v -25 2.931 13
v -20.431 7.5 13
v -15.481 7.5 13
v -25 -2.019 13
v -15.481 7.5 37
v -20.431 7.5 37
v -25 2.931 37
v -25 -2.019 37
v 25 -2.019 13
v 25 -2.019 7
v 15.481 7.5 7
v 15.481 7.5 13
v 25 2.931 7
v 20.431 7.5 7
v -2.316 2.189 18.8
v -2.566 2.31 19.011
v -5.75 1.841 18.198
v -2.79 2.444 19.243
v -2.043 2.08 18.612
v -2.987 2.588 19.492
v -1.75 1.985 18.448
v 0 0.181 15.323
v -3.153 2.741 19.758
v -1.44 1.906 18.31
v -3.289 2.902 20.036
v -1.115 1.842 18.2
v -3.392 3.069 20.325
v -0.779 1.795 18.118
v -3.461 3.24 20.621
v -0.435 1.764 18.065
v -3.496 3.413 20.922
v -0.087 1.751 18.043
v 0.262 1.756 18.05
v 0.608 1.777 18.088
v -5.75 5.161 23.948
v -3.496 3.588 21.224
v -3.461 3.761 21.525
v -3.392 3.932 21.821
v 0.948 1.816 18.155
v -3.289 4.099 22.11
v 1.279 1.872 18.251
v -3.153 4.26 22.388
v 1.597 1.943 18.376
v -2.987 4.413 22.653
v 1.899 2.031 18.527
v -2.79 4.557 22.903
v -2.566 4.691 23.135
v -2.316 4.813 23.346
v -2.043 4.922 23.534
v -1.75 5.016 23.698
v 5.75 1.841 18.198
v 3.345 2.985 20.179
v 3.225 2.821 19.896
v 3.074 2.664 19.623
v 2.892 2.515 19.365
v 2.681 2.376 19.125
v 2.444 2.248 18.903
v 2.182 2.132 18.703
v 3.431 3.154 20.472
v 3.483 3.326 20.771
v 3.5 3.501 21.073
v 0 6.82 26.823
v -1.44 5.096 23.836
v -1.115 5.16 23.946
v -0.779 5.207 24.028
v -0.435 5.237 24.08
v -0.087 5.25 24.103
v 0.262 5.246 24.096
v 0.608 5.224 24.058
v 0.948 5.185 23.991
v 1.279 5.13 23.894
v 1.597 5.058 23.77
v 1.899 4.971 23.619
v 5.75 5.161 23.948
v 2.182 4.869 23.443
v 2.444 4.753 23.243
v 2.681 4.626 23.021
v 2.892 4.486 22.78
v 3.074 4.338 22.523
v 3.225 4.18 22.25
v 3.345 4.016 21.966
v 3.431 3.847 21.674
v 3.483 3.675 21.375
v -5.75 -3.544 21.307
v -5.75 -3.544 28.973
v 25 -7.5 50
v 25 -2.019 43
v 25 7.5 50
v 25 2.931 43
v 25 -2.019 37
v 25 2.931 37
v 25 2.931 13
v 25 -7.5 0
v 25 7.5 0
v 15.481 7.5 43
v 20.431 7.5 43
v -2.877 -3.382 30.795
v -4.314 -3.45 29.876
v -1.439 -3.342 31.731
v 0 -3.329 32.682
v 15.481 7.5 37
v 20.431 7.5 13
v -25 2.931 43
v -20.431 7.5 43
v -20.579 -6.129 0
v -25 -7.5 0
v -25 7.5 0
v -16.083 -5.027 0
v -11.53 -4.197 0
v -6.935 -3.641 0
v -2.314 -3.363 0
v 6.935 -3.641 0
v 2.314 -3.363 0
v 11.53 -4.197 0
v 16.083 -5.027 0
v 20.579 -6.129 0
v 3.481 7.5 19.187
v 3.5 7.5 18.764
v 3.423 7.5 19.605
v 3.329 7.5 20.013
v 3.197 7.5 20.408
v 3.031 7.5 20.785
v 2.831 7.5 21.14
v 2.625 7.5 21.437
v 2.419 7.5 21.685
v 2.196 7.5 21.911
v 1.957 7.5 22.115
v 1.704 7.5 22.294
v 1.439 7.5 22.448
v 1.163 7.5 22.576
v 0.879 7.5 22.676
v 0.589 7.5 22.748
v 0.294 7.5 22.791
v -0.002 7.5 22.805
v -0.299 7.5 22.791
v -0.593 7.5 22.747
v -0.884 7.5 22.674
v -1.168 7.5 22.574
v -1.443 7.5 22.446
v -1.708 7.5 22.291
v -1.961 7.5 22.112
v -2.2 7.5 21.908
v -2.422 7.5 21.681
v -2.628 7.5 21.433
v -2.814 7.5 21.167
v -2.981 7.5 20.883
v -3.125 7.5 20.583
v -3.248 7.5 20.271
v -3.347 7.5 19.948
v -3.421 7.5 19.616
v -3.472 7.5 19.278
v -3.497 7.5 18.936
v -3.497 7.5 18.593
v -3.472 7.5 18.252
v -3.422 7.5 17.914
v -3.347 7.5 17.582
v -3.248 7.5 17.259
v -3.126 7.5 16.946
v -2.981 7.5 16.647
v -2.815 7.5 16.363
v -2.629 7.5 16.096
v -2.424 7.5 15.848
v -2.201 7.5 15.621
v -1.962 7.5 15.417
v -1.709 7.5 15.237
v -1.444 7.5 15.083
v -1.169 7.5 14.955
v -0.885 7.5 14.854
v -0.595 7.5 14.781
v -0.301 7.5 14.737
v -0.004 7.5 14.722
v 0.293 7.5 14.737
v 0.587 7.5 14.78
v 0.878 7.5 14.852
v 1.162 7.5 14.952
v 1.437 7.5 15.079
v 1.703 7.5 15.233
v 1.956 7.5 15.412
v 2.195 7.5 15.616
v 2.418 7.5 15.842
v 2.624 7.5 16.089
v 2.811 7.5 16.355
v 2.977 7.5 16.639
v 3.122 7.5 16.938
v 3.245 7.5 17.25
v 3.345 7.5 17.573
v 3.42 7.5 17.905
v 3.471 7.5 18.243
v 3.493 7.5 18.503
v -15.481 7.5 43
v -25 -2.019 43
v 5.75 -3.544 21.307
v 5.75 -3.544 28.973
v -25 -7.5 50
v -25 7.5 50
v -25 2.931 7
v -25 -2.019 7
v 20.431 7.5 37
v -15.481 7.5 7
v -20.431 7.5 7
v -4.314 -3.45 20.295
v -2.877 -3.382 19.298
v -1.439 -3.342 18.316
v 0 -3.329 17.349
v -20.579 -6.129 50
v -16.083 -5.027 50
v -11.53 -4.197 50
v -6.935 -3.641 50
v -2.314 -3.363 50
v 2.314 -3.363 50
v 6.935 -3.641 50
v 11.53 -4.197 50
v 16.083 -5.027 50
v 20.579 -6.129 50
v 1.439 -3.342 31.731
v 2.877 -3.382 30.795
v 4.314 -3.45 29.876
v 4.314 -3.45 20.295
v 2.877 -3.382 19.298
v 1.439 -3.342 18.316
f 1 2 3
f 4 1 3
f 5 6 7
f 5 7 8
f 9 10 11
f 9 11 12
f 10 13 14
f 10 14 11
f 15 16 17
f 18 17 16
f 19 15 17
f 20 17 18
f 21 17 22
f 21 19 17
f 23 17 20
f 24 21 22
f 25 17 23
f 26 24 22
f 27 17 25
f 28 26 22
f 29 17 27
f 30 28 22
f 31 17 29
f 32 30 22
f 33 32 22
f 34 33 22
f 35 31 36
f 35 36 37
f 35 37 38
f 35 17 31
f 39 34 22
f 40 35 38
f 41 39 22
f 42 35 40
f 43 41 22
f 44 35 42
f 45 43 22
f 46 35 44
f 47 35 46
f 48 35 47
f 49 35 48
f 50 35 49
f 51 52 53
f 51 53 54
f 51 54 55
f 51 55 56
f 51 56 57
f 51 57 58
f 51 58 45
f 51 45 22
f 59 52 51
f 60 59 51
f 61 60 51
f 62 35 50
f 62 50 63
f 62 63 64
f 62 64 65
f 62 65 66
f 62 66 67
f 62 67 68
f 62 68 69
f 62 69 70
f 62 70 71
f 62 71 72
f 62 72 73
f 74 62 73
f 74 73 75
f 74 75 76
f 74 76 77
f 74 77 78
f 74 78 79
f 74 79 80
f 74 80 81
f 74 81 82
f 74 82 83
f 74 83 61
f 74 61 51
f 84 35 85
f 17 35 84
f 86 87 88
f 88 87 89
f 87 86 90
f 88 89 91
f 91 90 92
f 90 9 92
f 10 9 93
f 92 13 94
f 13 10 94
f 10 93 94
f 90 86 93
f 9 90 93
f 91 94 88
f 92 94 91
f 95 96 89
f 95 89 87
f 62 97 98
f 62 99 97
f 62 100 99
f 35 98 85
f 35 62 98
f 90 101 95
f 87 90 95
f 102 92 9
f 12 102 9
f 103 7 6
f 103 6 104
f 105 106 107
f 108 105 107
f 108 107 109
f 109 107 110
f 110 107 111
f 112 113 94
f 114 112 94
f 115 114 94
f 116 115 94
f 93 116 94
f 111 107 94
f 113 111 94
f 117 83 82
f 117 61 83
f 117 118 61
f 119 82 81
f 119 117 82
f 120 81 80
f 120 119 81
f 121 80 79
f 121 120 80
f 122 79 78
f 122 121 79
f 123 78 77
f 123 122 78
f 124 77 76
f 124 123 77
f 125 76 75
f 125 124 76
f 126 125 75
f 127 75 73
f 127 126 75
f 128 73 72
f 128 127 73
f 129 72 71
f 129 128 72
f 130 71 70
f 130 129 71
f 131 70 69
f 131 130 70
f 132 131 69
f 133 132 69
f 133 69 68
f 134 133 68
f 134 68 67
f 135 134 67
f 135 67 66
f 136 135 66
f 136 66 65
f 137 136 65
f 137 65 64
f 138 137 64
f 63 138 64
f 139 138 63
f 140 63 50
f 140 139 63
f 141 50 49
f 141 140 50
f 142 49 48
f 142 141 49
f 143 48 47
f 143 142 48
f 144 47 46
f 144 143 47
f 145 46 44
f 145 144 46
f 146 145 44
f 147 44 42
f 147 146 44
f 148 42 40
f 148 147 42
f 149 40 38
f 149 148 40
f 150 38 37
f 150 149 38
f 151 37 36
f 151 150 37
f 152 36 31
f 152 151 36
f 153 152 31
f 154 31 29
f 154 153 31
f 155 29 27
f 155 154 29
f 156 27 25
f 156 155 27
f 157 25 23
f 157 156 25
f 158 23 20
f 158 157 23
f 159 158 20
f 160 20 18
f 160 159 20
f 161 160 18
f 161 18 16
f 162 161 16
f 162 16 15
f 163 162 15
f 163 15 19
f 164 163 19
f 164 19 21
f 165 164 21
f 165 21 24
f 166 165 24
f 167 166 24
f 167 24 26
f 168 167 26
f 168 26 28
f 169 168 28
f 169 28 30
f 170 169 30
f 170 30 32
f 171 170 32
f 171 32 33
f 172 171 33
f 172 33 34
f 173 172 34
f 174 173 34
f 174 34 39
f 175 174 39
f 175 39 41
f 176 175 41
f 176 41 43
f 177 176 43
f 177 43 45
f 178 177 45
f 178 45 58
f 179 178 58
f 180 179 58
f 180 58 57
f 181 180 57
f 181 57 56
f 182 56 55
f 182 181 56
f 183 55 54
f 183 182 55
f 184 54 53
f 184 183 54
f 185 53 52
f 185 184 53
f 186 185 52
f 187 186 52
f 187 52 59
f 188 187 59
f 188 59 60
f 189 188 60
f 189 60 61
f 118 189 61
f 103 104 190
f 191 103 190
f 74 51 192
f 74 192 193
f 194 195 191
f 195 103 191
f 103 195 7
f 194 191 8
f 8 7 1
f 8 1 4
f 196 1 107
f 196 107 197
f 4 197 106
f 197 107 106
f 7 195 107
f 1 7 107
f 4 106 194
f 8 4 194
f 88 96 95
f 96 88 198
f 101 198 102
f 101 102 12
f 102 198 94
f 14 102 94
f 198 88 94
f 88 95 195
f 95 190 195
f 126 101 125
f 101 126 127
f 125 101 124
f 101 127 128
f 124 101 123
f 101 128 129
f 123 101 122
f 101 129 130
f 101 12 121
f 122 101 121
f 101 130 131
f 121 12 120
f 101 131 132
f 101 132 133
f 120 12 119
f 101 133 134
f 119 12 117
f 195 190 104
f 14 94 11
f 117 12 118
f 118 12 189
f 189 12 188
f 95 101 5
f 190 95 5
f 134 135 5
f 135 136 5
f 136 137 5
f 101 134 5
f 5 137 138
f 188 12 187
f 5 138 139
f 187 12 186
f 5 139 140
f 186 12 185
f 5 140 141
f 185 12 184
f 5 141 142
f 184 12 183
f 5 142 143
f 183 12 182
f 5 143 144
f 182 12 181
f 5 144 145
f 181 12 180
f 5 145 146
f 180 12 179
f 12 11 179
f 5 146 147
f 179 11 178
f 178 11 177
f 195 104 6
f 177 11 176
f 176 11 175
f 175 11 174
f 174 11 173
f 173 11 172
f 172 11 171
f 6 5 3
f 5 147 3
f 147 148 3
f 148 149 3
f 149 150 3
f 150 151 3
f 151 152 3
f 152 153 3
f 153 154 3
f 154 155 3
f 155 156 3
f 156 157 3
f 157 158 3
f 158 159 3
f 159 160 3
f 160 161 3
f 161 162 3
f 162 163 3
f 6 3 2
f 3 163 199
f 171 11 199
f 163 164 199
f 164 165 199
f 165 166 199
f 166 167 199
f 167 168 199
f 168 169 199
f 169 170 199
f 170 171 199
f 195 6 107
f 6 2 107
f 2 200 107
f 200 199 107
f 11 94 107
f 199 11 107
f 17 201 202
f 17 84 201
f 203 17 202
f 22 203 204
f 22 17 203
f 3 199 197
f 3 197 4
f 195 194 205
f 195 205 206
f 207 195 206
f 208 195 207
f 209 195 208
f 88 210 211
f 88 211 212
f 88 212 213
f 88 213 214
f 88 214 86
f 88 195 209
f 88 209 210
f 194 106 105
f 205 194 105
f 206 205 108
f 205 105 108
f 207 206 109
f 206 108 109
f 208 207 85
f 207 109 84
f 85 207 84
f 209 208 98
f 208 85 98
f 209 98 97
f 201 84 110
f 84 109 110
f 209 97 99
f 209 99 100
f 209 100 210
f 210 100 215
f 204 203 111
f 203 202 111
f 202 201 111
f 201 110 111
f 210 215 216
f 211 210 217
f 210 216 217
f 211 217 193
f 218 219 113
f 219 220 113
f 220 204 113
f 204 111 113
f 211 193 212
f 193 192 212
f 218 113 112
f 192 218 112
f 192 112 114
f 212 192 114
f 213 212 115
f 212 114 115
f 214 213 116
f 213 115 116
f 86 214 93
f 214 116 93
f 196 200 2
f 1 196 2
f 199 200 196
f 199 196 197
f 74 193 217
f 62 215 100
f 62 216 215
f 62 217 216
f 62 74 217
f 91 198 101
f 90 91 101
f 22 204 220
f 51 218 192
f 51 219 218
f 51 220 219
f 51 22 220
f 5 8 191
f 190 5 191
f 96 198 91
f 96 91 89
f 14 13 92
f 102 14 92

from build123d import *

# Parameters (mm, degrees)
F1_DEPTH  = 50
F3_R      = 3.5
F4_DEPTH  = 25
F5_START  = 14
F5_DEPTH  = 18
F7_W      = 3.5
F7_H      = 6
F8_DEPTH  = 12.5
F10_W     = 3.5
F10_H     = 6
F11_DEPTH = 12.5


with BuildPart() as f1:
    # F0 (on Top) → F1 (new body)
    with BuildSketch(Plane.XY):
        with BuildLine():
            ThreePointArc((-25, -7.5), (0, -3.3285658241), (25, -7.5))
            Line((25, -7.5), (25, 7.5))
            Line((25, 7.5), (-25, 7.5))
            Line((-25, 7.5), (-25, -7.5))
        make_face()
    extrude(amount=F1_DEPTH)

    # F3 (on face) → F4 (cut)
    with BuildSketch(Plane(origin=(0, 5.625, -3.2475952642), x_dir=(1, 0, 0), z_dir=(0, -0.8660254038, 0.5))):
        with Locations((0, 20)):
            Circle(F3_R)
    extrude(amount=F4_DEPTH, mode=Mode.SUBTRACT)

    # F3 (on face) → F5 (cut)
    with BuildSketch(Plane(origin=(0, 5.625, -3.2475952642), x_dir=(1, 0, 0), z_dir=(0, -0.8660254038, 0.5)).offset(F5_START)):
        Polygon((-5.75, 23.3197640478), (-5.75, 16.6802359522), (0, 13.3604719043), (5.75, 16.6802359522), (5.75, 23.3197640478), (0, 26.6395280957), align=None)
        with Locations((0, 20)):
            Circle(F3_R, mode=Mode.SUBTRACT)
        with Locations((0, 20)):
            Circle(F3_R)
    extrude(amount=F5_DEPTH, mode=Mode.SUBTRACT)

    # F7 (on face) → F8 (cut, symmetric)
    with BuildSketch(Plane(origin=(8.75, -8.75, 0), x_dir=(-0.7071067812, -0.7071067812, 0), z_dir=(-0.7071067812, 0.7071067812, 0))):
        with Locations((-18, 10)):
            Rectangle(F7_W, F7_H)
        with Locations((-18, 40)):
            Rectangle(F7_W, F7_H)
    extrude(amount=F8_DEPTH, both=True, mode=Mode.SUBTRACT)

    # F10 (on face) → F11 (cut, symmetric)
    with BuildSketch(Plane(origin=(-8.75, -8.75, 0), x_dir=(0.7071067812, -0.7071067812, 0), z_dir=(-0.7071067812, -0.7071067812, 0))):
        with Locations((-18, 10)):
            Rectangle(F10_W, F10_H)
        with Locations((-18, 40)):
            Rectangle(F10_W, F10_H)
    extrude(amount=F11_DEPTH, both=True, mode=Mode.SUBTRACT)


solid = f1.part
